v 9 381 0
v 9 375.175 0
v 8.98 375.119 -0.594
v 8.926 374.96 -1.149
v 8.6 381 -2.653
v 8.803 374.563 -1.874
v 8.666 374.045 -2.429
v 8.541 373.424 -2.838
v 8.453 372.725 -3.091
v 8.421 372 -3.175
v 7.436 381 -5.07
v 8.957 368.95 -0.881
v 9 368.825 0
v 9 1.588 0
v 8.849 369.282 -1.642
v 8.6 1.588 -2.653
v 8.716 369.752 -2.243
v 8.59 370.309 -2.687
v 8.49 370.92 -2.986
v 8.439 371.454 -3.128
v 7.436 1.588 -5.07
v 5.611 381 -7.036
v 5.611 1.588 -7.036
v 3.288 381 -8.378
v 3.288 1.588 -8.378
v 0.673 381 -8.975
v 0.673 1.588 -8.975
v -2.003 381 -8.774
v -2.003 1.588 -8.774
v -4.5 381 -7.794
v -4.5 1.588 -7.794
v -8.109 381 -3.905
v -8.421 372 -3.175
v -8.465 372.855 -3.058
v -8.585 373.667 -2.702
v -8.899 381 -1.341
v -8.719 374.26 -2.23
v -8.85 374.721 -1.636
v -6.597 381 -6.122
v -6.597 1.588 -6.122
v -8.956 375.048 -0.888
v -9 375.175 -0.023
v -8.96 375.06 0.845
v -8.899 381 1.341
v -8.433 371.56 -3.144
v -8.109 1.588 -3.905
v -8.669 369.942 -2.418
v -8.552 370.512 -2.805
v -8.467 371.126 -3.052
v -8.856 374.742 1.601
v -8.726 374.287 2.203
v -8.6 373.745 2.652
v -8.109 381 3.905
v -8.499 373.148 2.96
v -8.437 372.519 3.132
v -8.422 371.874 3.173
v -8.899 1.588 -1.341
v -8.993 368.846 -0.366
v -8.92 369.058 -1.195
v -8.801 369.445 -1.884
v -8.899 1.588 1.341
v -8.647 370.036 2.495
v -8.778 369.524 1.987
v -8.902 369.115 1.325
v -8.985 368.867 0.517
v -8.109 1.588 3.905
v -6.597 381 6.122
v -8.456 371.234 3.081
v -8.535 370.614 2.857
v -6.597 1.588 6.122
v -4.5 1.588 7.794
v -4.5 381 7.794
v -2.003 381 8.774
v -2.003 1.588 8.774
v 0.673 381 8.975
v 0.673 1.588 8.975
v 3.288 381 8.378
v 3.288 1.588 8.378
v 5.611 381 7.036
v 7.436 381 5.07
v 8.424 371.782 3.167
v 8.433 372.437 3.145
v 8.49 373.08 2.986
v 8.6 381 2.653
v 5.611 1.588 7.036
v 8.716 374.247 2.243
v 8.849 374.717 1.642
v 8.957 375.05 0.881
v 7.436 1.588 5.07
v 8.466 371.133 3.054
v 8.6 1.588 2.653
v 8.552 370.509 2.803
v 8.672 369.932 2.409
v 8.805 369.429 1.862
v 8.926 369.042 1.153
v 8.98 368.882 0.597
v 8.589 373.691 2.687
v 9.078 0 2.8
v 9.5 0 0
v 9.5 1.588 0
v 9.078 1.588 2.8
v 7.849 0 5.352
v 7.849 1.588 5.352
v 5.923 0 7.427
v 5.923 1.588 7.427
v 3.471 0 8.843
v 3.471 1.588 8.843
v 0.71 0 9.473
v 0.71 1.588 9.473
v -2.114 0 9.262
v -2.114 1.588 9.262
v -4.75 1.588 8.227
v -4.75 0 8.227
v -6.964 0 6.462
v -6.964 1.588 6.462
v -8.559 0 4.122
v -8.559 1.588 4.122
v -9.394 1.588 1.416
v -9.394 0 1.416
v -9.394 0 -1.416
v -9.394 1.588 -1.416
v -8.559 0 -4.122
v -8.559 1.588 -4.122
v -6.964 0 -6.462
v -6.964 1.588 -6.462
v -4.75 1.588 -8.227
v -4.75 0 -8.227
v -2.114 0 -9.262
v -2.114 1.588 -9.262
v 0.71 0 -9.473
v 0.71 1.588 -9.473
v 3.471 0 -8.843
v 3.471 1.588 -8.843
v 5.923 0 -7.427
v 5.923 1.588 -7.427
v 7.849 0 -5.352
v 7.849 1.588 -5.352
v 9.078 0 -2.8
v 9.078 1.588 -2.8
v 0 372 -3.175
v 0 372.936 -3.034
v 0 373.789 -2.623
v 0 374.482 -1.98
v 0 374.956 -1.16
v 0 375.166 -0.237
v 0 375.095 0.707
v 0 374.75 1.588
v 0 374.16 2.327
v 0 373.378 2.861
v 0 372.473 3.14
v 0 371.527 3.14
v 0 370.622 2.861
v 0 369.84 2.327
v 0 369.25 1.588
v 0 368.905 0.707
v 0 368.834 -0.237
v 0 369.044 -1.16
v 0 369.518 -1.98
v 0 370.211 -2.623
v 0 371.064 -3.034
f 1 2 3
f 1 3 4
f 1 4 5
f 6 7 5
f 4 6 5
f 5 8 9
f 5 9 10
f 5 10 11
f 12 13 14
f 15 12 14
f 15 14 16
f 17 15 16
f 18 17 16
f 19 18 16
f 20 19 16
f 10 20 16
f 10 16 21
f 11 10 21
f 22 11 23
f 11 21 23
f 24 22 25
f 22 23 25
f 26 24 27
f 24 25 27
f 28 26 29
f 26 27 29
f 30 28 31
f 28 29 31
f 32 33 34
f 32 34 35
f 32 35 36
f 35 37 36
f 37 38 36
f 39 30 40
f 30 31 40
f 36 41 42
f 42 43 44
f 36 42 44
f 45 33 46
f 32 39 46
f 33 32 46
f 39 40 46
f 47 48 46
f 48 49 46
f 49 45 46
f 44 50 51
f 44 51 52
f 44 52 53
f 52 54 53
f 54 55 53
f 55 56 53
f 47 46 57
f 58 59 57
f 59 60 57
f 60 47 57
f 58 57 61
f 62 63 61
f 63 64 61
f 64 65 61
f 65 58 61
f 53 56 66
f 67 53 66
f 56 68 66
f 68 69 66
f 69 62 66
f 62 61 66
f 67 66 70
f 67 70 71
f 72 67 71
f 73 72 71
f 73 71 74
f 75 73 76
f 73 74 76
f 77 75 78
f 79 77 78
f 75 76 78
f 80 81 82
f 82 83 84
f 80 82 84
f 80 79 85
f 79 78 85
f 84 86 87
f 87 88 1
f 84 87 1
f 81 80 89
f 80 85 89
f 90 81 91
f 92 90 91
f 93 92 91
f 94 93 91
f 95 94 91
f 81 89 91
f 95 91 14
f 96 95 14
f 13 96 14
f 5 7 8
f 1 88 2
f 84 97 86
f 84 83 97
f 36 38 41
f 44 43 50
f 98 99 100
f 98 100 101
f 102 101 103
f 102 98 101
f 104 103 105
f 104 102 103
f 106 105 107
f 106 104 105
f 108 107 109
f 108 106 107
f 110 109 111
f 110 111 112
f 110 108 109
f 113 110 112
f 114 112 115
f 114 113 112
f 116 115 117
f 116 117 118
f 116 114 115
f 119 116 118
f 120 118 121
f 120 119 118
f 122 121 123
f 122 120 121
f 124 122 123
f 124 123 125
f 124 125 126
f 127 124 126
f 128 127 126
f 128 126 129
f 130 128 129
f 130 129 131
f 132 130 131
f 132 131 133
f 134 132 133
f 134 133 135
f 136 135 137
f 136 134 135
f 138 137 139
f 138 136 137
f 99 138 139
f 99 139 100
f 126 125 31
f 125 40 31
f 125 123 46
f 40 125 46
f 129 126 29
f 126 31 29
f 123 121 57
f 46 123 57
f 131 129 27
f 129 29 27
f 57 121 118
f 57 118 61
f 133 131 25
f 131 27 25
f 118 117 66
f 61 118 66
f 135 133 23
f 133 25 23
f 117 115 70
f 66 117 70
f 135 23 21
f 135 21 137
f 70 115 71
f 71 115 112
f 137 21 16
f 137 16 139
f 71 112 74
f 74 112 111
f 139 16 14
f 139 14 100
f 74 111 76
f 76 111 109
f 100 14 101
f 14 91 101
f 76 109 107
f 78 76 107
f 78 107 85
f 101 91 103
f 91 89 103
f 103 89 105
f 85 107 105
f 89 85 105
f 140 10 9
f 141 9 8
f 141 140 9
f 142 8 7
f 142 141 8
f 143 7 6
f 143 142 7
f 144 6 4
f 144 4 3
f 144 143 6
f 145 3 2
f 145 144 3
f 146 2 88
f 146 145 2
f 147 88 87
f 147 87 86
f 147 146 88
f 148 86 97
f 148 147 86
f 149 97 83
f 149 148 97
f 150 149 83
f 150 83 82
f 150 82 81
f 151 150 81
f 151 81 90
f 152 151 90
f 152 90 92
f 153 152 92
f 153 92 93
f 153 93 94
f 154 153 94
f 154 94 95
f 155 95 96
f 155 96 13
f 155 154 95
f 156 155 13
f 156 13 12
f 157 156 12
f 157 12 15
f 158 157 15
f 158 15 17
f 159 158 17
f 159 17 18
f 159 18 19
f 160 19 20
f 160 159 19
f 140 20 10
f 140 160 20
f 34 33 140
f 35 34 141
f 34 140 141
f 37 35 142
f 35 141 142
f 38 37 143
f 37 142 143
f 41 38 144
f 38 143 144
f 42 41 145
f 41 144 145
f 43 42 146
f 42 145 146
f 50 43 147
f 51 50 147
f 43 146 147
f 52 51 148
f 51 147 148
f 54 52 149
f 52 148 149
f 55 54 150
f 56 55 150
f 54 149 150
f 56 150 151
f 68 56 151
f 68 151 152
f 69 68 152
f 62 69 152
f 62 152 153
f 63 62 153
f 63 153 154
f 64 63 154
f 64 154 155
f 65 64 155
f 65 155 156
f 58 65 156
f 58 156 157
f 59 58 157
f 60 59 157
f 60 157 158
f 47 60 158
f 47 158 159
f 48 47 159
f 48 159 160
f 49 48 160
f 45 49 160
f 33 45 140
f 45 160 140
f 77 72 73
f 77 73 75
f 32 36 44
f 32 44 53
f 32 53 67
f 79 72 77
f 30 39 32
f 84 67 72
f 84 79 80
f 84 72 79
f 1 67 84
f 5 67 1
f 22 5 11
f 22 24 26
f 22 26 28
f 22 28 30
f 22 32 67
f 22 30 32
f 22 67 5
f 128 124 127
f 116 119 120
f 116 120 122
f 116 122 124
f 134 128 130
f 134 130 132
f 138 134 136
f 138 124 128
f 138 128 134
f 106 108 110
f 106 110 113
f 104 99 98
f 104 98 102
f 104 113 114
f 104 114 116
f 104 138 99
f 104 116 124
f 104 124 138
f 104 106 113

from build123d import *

# Parameters (mm, degrees)
SKETCH2_R               = 9
BOSS_EXTRUDE1_DEPTH     = 381
SKETCH3_R               = 9.5
BOSS_EXTRUDE2_DEPTH     = 1.5875
SKETCH4_R               = 3.175
CUT_EXTRUDE1_DEPTH      = 10.5
CUT_EXTRUDE1_DEPTH_BACK = 10.5


with BuildPart() as part:
    # Sketch2 → Boss-Extrude1 (new body)
    with BuildSketch(Plane(origin=(0, 0, 0), x_dir=(1, 0, 0), z_dir=(0, 1, 0))):
        Circle(SKETCH2_R)
    extrude(amount=BOSS_EXTRUDE1_DEPTH)

    # Sketch3 → Boss-Extrude2 (add)
    with BuildSketch(Plane.XZ):
        Circle(SKETCH3_R)
    extrude(amount=-BOSS_EXTRUDE2_DEPTH)

    # Sketch4 → Cut-Extrude1 (cut, two sides)
    with BuildSketch(Plane(origin=(0, 0, 0), x_dir=(0, 0, -1), z_dir=(1, 0, 0))) as cut_extrude1_sk:
        with Locations((0, 372)):
            Circle(SKETCH4_R)
    extrude(amount=CUT_EXTRUDE1_DEPTH, mode=Mode.SUBTRACT)
    extrude(cut_extrude1_sk.sketch, amount=-CUT_EXTRUDE1_DEPTH_BACK, mode=Mode.SUBTRACT)


solid = part.part
